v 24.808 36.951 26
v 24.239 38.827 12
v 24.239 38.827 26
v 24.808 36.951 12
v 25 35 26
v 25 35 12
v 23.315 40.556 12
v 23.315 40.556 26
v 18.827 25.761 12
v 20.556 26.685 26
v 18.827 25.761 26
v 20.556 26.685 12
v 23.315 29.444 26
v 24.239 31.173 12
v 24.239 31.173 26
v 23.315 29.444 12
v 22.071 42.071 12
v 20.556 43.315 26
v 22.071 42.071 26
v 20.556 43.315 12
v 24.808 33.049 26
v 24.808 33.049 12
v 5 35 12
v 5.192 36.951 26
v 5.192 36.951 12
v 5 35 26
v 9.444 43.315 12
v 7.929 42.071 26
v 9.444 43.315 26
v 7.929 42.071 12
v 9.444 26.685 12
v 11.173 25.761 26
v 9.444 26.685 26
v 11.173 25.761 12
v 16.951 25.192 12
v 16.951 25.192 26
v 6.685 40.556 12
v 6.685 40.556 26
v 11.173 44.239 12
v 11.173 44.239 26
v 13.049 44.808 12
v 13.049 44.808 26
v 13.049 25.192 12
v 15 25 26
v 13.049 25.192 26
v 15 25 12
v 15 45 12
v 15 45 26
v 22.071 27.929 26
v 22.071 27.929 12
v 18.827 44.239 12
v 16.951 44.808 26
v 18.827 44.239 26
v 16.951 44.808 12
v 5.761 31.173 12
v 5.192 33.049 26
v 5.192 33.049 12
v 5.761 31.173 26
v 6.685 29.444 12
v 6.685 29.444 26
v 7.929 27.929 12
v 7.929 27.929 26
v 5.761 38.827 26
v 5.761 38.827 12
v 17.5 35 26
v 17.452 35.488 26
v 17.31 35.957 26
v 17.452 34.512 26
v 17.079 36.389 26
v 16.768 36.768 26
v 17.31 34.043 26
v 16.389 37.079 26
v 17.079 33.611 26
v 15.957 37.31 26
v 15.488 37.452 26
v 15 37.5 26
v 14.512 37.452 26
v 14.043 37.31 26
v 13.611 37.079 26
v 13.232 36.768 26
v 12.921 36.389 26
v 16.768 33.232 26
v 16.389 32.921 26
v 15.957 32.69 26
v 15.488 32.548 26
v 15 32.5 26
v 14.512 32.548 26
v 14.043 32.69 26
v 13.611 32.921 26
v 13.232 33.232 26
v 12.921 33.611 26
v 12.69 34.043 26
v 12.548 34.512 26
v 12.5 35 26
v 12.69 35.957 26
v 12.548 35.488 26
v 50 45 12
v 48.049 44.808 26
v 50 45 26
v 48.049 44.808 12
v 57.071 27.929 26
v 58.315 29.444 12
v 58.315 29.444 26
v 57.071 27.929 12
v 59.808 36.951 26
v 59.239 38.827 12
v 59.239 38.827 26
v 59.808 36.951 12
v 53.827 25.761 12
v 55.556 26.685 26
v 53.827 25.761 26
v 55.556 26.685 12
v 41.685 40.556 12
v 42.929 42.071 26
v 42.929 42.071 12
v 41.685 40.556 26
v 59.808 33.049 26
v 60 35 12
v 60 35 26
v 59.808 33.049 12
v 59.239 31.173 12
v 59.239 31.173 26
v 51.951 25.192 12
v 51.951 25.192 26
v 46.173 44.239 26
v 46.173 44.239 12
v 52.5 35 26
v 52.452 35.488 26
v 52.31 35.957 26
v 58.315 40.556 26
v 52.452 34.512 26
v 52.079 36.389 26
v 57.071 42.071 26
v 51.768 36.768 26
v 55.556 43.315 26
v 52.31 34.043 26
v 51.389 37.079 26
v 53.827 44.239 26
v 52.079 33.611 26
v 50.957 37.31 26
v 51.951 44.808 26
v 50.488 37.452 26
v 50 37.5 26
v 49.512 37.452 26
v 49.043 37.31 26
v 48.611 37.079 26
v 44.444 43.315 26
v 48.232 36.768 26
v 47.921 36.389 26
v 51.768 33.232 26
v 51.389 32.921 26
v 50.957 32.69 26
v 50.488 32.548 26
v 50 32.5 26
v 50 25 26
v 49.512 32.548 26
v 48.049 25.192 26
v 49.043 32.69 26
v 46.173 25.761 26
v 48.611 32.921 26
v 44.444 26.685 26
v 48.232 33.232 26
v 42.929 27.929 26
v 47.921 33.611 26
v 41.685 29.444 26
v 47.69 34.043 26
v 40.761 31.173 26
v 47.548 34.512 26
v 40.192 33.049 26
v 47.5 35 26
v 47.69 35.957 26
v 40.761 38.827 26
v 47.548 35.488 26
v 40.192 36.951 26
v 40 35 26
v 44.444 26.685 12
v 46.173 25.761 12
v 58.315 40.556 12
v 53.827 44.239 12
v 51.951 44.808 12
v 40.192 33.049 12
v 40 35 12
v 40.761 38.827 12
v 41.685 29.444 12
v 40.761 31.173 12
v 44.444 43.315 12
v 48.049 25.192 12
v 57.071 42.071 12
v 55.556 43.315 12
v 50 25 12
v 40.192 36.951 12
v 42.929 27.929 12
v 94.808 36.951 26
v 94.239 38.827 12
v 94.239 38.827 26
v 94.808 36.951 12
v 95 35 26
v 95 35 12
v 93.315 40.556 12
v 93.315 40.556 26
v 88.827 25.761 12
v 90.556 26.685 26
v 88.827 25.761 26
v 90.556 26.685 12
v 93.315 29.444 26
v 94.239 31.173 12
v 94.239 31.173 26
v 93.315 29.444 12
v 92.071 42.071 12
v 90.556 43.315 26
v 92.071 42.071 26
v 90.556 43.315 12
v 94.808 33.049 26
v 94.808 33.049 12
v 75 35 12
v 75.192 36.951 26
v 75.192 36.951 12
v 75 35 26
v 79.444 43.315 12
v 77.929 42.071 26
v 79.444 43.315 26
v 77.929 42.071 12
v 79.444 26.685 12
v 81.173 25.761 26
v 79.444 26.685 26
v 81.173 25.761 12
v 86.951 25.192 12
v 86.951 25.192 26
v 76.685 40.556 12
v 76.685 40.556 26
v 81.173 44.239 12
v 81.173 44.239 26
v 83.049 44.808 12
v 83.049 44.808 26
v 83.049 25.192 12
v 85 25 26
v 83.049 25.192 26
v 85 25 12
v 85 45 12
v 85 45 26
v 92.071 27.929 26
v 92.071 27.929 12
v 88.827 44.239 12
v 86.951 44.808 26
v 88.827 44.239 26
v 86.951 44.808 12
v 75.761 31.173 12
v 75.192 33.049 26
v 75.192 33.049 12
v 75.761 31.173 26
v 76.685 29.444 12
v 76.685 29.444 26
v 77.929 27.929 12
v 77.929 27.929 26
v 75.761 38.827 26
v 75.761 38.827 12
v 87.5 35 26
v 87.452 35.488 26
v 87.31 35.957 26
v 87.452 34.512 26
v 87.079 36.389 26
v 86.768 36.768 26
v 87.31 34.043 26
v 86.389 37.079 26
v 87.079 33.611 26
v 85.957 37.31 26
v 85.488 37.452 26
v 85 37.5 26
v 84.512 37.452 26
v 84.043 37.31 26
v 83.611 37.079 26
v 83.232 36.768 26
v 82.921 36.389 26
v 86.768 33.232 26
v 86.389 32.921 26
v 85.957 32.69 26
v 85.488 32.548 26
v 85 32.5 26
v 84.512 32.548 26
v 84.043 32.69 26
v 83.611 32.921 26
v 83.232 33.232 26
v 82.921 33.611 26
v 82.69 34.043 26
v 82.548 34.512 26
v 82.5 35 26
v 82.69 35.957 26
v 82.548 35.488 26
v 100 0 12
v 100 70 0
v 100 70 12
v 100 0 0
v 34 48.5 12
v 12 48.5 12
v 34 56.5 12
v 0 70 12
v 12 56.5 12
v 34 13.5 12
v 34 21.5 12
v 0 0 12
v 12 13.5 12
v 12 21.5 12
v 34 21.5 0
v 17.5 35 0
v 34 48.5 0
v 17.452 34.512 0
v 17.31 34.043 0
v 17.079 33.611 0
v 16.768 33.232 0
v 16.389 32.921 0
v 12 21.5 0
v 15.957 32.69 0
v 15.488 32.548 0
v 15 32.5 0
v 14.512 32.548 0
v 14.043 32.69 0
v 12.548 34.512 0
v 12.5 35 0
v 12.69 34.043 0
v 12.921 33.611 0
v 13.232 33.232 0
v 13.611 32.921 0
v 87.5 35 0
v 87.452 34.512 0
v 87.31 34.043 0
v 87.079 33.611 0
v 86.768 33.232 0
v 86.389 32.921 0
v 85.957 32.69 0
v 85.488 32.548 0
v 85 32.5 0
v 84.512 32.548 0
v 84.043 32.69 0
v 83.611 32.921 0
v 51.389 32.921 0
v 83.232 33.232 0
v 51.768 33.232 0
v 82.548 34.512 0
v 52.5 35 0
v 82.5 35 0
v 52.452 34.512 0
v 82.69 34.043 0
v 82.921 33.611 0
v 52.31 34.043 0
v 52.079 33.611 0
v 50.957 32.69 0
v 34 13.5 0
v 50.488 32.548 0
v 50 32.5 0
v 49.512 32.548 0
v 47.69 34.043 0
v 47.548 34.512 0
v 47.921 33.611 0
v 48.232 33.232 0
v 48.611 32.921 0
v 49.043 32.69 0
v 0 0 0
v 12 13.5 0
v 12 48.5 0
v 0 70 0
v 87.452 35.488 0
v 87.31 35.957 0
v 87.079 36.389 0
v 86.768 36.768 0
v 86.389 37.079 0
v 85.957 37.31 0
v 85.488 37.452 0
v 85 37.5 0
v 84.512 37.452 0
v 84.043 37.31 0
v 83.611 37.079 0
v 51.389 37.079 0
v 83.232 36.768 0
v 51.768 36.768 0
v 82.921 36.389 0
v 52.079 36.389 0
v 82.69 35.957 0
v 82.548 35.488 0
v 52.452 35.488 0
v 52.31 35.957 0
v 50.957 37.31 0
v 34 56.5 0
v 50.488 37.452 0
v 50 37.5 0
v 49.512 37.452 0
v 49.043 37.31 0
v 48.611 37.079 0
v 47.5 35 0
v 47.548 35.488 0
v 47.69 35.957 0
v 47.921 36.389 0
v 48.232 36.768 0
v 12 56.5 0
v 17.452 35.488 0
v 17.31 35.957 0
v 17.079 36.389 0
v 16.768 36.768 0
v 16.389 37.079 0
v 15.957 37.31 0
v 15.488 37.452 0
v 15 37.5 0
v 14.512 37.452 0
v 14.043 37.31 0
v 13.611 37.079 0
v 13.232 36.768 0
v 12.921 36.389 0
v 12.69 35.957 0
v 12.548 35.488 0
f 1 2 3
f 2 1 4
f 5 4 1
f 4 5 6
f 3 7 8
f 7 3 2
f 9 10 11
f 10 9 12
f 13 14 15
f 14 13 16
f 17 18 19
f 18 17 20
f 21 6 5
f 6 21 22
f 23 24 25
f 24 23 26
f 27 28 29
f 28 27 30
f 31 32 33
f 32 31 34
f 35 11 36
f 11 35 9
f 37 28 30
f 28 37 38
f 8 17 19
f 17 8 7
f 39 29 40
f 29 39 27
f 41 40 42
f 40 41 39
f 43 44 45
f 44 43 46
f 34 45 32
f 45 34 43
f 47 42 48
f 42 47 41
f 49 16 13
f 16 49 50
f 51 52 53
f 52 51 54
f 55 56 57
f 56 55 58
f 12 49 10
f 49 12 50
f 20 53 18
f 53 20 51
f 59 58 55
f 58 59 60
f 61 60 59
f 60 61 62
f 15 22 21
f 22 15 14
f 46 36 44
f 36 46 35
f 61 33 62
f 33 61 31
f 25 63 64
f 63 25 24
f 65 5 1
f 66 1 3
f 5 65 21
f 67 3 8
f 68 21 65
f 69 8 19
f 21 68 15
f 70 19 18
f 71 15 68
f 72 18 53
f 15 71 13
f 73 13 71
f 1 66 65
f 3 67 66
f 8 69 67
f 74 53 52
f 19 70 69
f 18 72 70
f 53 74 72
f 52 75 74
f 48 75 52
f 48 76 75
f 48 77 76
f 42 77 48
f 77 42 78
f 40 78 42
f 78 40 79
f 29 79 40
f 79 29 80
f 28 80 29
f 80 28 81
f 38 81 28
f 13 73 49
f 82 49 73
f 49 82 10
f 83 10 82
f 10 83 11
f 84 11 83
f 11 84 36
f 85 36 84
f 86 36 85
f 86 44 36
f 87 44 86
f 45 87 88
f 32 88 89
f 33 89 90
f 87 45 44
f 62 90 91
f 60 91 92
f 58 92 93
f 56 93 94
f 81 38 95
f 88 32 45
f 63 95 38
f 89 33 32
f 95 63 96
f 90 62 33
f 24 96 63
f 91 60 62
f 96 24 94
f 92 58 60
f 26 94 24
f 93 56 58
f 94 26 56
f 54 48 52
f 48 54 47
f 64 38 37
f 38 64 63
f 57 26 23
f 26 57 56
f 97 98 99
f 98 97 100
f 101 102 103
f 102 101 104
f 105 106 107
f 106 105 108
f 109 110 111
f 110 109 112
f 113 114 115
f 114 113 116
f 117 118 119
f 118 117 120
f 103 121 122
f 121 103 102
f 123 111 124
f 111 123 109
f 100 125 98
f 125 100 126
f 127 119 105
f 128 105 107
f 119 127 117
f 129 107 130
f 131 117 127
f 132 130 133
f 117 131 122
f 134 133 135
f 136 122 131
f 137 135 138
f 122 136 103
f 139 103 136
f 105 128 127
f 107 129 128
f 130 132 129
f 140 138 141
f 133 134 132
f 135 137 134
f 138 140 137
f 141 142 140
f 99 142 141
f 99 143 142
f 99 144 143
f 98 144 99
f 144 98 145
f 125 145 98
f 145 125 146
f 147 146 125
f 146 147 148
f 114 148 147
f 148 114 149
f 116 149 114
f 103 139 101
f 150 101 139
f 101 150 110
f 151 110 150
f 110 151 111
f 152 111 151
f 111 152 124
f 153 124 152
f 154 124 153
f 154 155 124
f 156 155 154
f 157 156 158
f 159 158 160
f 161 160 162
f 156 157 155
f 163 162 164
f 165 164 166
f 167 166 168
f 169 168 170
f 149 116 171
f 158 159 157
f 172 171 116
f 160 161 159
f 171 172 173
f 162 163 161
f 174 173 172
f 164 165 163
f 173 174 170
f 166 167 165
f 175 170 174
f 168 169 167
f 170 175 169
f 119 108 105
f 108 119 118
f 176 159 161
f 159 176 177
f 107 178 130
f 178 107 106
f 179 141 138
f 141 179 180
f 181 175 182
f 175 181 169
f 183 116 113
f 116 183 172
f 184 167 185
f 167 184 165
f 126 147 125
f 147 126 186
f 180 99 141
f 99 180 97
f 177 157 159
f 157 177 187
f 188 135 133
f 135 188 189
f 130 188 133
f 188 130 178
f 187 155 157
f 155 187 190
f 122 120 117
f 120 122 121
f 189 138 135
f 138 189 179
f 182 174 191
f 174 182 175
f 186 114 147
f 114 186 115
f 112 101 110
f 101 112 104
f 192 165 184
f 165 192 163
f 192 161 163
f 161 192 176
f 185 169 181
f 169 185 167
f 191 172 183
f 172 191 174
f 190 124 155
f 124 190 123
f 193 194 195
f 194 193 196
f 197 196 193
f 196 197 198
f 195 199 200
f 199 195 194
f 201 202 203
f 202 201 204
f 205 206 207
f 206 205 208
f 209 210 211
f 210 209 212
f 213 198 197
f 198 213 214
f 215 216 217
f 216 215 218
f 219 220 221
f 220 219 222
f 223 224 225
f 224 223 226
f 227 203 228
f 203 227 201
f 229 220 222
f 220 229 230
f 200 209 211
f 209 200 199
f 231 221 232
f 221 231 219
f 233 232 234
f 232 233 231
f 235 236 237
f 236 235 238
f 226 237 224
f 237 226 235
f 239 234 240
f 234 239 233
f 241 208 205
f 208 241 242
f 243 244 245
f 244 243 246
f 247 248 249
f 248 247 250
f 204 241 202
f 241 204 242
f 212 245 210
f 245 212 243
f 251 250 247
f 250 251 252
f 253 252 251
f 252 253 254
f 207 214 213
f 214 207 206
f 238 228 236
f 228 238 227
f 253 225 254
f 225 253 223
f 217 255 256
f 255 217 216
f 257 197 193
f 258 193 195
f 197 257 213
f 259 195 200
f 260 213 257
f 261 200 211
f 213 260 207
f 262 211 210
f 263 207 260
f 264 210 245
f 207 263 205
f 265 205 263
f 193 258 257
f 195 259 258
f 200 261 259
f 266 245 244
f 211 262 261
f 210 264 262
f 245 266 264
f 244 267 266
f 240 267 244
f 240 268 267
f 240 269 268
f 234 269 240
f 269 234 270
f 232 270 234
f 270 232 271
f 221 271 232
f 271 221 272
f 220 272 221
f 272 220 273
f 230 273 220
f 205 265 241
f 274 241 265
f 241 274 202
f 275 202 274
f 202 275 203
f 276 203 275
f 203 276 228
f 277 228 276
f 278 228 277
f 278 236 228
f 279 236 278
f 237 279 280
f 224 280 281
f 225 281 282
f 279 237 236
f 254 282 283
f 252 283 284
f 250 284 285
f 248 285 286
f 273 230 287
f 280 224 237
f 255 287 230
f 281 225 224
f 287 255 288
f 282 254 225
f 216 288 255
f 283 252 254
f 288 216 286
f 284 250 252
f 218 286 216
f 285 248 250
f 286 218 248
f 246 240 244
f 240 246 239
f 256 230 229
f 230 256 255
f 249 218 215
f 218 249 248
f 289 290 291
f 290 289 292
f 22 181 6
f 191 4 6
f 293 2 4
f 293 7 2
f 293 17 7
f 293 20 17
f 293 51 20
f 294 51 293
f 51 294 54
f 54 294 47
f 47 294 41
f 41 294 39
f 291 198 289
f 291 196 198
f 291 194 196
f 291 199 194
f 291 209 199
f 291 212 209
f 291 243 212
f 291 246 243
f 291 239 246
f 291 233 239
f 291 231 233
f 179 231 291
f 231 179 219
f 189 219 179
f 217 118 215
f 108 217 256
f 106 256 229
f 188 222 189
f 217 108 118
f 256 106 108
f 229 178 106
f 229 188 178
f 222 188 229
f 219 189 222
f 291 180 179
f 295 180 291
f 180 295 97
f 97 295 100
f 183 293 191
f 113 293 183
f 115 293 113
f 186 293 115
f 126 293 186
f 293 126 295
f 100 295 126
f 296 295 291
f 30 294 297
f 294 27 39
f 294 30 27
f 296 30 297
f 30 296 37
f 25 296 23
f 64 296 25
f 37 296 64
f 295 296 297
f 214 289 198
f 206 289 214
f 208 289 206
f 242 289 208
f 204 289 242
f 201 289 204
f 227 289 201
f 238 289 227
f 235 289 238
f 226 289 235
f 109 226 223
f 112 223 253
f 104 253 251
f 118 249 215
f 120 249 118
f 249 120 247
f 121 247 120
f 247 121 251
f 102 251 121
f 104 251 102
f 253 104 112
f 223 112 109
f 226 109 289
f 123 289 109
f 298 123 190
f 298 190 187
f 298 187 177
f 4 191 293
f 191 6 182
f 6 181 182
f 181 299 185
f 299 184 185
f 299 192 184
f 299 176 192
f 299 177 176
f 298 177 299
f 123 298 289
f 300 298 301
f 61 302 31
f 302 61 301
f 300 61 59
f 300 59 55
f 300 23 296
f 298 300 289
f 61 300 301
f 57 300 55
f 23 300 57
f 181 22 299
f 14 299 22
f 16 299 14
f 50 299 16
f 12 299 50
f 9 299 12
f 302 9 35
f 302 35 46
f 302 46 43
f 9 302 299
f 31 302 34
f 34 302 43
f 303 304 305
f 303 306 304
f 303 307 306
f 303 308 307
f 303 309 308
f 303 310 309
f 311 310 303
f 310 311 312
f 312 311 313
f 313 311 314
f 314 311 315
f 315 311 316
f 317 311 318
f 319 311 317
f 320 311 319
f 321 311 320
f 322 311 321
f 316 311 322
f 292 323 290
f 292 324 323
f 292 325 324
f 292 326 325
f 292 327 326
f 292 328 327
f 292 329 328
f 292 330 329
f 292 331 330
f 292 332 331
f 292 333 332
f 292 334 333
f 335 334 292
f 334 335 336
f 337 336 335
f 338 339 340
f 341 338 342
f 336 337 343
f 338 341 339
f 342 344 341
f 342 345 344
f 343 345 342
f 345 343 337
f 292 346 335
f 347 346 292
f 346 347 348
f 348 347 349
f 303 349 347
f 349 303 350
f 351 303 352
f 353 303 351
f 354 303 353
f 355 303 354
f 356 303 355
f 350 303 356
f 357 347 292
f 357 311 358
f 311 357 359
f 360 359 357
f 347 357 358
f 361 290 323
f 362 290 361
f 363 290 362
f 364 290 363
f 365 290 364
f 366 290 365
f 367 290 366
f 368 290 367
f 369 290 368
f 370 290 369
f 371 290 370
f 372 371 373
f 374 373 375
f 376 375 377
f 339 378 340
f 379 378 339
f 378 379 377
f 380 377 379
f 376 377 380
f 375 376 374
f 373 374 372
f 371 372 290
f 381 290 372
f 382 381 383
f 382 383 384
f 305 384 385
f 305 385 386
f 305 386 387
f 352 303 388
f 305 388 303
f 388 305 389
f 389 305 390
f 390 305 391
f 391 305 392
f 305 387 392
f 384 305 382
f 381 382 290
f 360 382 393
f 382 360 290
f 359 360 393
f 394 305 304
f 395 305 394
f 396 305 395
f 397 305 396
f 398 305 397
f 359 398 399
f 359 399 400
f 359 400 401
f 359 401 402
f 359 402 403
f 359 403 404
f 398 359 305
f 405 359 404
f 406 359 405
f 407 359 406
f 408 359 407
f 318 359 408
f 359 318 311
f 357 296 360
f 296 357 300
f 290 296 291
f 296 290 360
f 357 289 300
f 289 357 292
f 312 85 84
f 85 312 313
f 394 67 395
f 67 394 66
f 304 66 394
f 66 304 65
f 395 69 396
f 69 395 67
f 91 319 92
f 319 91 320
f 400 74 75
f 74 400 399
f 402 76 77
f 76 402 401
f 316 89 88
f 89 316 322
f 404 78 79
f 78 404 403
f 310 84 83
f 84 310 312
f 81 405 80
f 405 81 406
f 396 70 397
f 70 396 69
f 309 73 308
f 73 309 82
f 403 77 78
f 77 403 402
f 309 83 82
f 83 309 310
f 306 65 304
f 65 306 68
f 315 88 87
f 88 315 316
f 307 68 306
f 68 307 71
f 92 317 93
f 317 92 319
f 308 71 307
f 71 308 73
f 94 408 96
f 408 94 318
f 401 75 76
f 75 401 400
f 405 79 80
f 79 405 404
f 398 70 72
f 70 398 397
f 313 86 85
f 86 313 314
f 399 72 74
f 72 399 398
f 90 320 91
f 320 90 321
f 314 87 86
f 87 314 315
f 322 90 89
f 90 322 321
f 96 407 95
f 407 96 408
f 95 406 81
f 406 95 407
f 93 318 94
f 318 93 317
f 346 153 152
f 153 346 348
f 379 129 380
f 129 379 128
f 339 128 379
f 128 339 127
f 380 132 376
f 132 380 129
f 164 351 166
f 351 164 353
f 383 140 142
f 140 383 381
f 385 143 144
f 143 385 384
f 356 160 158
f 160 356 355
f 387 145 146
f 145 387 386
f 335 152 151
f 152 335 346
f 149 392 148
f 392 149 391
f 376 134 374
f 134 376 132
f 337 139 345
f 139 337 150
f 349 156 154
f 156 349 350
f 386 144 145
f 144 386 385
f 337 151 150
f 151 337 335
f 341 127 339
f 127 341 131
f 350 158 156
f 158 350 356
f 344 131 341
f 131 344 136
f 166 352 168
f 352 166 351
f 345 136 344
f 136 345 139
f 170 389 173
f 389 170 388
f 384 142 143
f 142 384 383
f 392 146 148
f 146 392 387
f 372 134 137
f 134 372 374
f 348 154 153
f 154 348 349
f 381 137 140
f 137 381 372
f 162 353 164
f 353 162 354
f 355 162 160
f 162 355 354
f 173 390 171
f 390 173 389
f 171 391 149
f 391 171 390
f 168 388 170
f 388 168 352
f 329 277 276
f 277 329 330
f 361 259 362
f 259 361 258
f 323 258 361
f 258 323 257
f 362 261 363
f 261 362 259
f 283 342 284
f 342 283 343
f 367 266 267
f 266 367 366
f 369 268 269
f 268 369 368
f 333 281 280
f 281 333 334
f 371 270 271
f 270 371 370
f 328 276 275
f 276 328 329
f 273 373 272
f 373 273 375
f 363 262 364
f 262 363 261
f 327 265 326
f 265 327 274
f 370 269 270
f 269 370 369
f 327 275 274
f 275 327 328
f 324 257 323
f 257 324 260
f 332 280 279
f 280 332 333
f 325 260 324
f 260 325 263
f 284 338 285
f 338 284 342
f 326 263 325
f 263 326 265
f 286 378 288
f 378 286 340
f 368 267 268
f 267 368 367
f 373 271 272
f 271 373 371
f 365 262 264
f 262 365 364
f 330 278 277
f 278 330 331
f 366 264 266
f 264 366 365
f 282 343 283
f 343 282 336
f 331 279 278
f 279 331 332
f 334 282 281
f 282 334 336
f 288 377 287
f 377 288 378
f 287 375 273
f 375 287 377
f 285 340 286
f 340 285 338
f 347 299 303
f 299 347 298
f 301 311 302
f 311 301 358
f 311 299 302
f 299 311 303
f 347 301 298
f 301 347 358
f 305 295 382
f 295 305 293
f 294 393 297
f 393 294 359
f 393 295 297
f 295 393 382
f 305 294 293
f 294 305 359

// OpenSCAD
$fn = 32;

// ----------------------------------------------------------------------
// Drill jig: three_boss_slot jig
// ----------------------------------------------------------------------

// --- parameters (mm) ---
plate_l = 100;            // plate length, X
plate_w = 70;             // plate width, Y
plate_t = 12;             // plate thickness
boss_d = 20;              // guide boss diameter
boss_h = 15;              // boss height above the plate
guide_d = 5;              // guide hole diameter
boss_pitch = 35;          // boss pitch
slot_w = 8;               // clamp slot width
slot_l = 22;              // clamp slot length
slot_x = 12;              // slot start X

n_boss = 3;  // guide bosses
boss_x0 = (plate_l - (n_boss - 1) * boss_pitch) / 2;  // first boss X
boss_top = plate_t - 1 + boss_h;  // boss crown height
total_h = boss_top;  // overall height

difference() {
  union() {
  cube([plate_l, plate_w, plate_t]);
  for (i = [0 : n_boss - 1])
    translate([boss_x0 + i * boss_pitch, plate_w / 2, plate_t - 1])
      cylinder(h = boss_h, d = boss_d);
  }
  for (i = [0 : n_boss - 1])
    translate([boss_x0 + i * boss_pitch, plate_w / 2, -1])
      cylinder(h = plate_t + boss_h, d = guide_d);
  for (cy = [plate_w * 0.25, plate_w * 0.75])
    translate([slot_x, cy - slot_w / 2, -1])
      cube([slot_l, slot_w, plate_t + 2]);
}
